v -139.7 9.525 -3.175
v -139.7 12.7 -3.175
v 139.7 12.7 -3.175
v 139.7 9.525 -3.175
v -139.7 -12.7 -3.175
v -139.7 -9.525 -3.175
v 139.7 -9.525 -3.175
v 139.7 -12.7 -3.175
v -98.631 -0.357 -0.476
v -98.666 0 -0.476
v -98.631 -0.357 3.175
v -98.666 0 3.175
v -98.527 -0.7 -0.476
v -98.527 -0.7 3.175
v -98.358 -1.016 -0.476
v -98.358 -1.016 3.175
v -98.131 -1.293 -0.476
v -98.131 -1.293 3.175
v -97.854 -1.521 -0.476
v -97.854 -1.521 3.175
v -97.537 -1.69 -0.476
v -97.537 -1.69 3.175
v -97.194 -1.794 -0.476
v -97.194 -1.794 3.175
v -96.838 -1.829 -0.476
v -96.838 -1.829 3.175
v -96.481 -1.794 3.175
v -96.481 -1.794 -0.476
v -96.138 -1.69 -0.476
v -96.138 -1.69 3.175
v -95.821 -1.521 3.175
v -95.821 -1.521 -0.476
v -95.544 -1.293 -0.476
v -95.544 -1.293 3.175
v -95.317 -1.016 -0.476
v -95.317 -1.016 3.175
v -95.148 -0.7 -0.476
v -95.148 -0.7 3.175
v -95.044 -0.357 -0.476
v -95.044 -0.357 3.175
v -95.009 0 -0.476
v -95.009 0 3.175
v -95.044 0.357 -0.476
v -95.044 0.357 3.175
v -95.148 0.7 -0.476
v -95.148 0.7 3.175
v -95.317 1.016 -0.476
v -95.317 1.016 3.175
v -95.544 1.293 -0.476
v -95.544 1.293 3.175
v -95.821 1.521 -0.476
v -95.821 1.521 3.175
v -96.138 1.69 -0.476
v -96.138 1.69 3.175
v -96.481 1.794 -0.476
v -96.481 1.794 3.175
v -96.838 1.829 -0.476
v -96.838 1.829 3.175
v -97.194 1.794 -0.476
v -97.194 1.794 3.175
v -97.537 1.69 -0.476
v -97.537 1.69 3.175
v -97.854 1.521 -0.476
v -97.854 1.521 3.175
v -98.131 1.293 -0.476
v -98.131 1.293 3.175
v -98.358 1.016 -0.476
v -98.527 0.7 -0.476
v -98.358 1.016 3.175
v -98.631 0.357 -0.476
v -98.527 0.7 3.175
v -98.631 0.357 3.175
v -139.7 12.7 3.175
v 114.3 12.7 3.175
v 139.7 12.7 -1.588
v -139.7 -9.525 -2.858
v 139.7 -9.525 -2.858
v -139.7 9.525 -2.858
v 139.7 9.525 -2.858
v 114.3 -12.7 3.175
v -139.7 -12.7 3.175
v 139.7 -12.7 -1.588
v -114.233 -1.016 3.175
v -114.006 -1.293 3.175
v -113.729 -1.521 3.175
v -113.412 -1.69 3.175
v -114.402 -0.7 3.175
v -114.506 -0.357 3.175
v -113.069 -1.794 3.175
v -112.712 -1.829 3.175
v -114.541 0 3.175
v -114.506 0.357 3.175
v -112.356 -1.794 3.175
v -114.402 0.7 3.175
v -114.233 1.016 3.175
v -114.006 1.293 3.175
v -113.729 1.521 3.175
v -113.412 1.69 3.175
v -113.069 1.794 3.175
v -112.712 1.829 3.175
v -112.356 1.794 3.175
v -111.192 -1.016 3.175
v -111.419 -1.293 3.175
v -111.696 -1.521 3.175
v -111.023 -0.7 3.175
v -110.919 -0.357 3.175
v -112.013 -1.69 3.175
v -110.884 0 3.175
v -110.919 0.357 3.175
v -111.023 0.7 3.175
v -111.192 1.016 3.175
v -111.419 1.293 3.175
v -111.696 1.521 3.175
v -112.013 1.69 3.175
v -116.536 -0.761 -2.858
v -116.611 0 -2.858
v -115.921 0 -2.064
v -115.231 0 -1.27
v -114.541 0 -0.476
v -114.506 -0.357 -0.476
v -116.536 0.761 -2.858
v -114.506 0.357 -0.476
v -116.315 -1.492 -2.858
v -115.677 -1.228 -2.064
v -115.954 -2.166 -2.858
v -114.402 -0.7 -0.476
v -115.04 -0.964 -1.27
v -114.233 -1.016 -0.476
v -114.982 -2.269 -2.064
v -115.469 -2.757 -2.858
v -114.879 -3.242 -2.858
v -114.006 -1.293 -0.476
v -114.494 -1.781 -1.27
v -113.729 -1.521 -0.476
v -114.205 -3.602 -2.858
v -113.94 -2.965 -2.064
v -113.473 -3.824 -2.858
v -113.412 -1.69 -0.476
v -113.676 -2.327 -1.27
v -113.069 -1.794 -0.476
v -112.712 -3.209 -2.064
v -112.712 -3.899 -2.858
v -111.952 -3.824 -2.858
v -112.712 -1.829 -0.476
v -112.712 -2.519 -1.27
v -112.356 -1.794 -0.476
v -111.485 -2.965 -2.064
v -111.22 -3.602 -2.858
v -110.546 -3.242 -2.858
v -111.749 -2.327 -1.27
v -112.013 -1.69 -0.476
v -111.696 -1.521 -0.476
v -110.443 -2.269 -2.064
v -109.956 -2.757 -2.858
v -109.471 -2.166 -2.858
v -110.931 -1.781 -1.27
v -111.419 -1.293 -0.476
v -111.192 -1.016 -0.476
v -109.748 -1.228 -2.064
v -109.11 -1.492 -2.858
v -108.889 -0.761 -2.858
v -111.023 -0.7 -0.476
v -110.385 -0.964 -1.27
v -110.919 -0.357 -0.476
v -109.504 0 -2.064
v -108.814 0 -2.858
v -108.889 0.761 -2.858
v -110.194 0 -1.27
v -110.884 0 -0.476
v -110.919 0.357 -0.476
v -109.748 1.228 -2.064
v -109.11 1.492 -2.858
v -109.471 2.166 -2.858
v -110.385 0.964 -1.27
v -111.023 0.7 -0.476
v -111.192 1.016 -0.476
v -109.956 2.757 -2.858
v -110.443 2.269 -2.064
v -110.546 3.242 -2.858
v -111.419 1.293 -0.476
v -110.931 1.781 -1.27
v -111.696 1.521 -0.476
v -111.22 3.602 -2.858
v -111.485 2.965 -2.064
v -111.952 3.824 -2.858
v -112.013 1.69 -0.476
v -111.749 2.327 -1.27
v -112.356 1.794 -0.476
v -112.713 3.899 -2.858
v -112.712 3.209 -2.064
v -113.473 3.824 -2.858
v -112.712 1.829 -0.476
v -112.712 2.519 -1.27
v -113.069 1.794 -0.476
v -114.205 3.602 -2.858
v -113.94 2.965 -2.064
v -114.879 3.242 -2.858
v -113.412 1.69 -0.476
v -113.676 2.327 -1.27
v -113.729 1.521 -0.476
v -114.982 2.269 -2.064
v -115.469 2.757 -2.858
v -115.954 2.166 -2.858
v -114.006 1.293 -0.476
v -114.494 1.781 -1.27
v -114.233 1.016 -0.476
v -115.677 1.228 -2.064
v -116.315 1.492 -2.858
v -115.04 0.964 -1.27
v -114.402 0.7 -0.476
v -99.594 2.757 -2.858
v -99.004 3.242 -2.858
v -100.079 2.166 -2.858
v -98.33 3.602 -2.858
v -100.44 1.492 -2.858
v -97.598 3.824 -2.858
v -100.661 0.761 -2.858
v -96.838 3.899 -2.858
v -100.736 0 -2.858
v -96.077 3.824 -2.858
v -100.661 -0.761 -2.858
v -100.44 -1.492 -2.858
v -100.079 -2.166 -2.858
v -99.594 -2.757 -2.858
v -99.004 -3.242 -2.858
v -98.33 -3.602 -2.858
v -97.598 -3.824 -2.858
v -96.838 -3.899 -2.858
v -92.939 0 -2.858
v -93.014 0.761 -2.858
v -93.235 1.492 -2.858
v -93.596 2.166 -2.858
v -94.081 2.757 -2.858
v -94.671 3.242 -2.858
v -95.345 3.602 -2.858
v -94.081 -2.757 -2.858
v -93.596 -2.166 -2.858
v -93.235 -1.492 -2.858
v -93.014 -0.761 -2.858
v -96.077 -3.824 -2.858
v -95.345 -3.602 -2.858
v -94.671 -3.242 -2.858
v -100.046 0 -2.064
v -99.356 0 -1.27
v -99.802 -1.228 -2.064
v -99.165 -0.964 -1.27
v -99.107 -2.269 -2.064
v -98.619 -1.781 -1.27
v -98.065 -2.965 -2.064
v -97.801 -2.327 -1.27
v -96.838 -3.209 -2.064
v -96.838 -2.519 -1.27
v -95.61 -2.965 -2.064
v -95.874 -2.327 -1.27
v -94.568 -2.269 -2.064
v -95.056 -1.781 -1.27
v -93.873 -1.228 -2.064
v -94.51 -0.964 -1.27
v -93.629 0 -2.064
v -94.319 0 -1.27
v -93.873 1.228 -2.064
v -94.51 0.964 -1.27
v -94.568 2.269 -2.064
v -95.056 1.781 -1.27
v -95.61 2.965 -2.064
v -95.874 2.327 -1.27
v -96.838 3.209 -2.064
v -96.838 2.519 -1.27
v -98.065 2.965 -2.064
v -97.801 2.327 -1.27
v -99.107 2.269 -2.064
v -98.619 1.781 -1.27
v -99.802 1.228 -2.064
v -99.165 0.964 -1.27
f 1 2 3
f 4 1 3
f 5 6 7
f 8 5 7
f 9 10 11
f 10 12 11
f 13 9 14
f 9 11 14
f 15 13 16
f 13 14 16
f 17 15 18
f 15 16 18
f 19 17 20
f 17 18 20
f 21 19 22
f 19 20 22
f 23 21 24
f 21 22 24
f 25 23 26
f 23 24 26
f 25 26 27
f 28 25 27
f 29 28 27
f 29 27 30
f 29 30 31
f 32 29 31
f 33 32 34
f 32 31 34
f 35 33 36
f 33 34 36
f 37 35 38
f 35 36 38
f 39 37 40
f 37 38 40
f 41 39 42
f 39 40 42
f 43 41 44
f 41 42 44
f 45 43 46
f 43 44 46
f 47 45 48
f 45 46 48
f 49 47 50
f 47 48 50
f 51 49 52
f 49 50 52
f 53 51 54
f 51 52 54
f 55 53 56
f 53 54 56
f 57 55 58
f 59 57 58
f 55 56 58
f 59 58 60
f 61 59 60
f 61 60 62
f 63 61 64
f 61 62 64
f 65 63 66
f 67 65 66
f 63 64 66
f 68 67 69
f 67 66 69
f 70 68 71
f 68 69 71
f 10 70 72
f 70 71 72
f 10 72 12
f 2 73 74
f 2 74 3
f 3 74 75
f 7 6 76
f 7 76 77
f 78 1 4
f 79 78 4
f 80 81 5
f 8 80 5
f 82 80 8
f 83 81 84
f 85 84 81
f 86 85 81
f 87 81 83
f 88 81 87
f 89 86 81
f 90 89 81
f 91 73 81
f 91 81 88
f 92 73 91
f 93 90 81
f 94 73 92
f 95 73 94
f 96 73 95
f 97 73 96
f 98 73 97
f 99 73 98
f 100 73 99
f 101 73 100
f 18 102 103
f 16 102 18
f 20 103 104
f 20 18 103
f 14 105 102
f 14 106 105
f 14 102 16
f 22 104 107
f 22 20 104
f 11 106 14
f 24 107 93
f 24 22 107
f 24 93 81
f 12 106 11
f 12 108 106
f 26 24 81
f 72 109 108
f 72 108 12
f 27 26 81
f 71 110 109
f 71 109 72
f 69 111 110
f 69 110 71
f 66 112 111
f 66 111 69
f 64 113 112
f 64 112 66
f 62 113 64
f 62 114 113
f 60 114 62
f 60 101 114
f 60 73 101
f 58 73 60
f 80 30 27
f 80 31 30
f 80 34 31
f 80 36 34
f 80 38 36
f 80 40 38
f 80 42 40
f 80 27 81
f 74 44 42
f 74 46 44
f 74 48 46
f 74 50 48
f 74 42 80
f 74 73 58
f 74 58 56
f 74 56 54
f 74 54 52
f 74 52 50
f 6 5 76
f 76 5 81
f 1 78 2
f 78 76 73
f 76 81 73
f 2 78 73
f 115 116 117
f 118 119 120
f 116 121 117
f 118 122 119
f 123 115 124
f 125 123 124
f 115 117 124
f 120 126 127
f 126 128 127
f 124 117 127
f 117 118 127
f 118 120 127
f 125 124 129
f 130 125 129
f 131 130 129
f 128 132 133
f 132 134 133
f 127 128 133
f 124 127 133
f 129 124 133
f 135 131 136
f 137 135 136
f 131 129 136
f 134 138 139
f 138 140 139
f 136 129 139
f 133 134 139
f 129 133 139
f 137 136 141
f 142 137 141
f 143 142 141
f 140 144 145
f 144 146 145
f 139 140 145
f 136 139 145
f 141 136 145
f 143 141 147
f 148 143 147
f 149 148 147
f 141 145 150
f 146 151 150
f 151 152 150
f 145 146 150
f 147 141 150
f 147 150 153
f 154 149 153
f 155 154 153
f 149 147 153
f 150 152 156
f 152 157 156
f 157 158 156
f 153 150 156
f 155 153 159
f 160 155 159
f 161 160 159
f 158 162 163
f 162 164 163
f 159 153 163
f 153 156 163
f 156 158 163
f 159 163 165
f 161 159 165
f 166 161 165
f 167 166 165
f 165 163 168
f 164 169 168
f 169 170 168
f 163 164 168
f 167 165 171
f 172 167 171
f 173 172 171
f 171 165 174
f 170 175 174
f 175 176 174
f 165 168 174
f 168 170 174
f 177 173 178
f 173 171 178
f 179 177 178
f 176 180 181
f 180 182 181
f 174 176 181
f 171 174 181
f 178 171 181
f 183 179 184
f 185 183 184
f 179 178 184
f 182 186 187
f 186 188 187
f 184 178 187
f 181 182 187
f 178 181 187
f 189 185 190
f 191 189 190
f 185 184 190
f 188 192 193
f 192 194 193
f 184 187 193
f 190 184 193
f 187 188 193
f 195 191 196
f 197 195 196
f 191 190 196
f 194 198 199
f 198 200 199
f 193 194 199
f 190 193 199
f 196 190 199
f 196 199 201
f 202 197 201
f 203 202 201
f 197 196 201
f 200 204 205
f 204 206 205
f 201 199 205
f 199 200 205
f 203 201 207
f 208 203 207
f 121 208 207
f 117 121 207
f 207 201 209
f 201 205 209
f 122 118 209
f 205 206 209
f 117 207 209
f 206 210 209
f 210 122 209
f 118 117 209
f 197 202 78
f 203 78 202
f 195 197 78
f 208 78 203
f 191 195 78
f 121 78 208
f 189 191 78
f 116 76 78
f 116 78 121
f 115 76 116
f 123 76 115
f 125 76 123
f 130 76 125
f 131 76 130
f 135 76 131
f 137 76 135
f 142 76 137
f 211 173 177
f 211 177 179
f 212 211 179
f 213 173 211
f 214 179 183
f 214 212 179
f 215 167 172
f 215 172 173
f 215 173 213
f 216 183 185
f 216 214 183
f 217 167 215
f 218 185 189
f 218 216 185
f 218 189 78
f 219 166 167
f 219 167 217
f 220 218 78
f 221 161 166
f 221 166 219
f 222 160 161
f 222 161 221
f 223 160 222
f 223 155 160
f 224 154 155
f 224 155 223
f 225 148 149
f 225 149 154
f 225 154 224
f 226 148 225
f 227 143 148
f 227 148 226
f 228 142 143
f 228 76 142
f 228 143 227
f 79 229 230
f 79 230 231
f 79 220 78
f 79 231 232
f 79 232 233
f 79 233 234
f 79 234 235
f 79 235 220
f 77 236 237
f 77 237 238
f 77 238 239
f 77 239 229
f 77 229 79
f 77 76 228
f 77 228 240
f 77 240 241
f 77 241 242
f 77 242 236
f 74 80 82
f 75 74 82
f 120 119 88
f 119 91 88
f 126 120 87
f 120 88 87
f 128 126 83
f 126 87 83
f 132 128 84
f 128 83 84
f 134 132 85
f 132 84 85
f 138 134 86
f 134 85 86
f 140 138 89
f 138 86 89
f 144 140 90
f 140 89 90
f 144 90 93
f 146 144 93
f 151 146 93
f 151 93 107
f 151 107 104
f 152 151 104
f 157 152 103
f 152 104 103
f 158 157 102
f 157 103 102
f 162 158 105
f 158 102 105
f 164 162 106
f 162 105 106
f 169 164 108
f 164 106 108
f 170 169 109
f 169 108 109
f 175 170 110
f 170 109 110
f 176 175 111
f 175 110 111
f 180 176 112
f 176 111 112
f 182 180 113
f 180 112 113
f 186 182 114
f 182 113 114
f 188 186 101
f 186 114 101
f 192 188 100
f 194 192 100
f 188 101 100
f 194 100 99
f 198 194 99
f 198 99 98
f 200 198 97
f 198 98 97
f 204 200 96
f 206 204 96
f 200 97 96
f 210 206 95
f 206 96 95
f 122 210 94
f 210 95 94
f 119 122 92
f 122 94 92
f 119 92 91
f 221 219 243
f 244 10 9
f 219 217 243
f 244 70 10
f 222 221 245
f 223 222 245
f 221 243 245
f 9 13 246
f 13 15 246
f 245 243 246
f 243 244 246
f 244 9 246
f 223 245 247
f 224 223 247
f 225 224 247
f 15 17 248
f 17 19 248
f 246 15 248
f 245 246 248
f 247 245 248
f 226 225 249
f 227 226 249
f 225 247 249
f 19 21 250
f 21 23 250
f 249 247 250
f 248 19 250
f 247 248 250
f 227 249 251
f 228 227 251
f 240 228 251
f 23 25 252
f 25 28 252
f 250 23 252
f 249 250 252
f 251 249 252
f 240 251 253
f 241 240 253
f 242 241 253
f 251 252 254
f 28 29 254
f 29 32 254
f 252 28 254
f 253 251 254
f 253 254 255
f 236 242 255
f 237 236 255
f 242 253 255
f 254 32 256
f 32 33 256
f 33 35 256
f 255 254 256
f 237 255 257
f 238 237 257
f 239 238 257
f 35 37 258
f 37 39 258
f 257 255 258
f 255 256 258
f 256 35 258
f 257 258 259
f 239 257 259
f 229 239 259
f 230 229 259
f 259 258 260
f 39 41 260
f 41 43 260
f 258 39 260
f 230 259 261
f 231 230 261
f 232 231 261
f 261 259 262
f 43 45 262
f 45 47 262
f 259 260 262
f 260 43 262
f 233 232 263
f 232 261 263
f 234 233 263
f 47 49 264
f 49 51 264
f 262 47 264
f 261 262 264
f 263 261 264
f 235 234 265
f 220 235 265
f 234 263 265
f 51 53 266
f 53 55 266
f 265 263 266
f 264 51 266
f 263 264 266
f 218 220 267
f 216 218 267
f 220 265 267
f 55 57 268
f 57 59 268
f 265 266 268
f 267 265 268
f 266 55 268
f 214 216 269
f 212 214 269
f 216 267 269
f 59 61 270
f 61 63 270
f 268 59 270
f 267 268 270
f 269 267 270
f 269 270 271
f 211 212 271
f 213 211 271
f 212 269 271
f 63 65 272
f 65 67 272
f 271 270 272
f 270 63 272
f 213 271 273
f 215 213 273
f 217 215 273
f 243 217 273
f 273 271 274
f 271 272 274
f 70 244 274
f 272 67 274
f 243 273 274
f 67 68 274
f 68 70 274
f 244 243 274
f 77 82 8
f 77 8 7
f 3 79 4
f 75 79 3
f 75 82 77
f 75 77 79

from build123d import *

# Parameters (mm, degrees)
F0_W           = 279.4
F0_H           = 25.4
F1_DEPTH       = 3.175
F3_DEPTH       = 25.4
F4_W           = 279.4
F4_H           = 19.05
F5_DEPTH       = 0.3175
F7_D           = 3.6576
F7_CSINK_D     = 7.7978
F7_CSINK_ANGLE = 82


with BuildPart() as f1:
    # F0 (on Top) → F1 (new body, symmetric)
    with BuildSketch(Plane.XY):
        Rectangle(F0_W, F0_H)
    extrude(amount=F1_DEPTH, both=True)

    # F2 (on face) → F3 (cut)
    with BuildSketch(Plane.XZ.offset(12.7)):
        Polygon((139.7, 3.175), (114.3, 3.175), (139.7, -1.5875), align=None)
    extrude(amount=-F3_DEPTH, mode=Mode.SUBTRACT)

    # F4 (on face) → F5 (cut)
    with BuildSketch(Plane(origin=(0, 0, -3.175), x_dir=(1, 0, 0), z_dir=(0, 0, -1))):
        Rectangle(F4_W, F4_H)
    extrude(amount=-F5_DEPTH, mode=Mode.SUBTRACT)

    # F7 (through all)
    with Locations(Plane(origin=(0, 0, -2.8575), x_dir=(1, 0, 0), z_dir=(0, 0, -1))):
        with Locations((-112.7125, 0), (-96.8375, 0)):
            CounterSinkHole(F7_D / 2, F7_CSINK_D / 2, counter_sink_angle=F7_CSINK_ANGLE)


solid = f1.part
